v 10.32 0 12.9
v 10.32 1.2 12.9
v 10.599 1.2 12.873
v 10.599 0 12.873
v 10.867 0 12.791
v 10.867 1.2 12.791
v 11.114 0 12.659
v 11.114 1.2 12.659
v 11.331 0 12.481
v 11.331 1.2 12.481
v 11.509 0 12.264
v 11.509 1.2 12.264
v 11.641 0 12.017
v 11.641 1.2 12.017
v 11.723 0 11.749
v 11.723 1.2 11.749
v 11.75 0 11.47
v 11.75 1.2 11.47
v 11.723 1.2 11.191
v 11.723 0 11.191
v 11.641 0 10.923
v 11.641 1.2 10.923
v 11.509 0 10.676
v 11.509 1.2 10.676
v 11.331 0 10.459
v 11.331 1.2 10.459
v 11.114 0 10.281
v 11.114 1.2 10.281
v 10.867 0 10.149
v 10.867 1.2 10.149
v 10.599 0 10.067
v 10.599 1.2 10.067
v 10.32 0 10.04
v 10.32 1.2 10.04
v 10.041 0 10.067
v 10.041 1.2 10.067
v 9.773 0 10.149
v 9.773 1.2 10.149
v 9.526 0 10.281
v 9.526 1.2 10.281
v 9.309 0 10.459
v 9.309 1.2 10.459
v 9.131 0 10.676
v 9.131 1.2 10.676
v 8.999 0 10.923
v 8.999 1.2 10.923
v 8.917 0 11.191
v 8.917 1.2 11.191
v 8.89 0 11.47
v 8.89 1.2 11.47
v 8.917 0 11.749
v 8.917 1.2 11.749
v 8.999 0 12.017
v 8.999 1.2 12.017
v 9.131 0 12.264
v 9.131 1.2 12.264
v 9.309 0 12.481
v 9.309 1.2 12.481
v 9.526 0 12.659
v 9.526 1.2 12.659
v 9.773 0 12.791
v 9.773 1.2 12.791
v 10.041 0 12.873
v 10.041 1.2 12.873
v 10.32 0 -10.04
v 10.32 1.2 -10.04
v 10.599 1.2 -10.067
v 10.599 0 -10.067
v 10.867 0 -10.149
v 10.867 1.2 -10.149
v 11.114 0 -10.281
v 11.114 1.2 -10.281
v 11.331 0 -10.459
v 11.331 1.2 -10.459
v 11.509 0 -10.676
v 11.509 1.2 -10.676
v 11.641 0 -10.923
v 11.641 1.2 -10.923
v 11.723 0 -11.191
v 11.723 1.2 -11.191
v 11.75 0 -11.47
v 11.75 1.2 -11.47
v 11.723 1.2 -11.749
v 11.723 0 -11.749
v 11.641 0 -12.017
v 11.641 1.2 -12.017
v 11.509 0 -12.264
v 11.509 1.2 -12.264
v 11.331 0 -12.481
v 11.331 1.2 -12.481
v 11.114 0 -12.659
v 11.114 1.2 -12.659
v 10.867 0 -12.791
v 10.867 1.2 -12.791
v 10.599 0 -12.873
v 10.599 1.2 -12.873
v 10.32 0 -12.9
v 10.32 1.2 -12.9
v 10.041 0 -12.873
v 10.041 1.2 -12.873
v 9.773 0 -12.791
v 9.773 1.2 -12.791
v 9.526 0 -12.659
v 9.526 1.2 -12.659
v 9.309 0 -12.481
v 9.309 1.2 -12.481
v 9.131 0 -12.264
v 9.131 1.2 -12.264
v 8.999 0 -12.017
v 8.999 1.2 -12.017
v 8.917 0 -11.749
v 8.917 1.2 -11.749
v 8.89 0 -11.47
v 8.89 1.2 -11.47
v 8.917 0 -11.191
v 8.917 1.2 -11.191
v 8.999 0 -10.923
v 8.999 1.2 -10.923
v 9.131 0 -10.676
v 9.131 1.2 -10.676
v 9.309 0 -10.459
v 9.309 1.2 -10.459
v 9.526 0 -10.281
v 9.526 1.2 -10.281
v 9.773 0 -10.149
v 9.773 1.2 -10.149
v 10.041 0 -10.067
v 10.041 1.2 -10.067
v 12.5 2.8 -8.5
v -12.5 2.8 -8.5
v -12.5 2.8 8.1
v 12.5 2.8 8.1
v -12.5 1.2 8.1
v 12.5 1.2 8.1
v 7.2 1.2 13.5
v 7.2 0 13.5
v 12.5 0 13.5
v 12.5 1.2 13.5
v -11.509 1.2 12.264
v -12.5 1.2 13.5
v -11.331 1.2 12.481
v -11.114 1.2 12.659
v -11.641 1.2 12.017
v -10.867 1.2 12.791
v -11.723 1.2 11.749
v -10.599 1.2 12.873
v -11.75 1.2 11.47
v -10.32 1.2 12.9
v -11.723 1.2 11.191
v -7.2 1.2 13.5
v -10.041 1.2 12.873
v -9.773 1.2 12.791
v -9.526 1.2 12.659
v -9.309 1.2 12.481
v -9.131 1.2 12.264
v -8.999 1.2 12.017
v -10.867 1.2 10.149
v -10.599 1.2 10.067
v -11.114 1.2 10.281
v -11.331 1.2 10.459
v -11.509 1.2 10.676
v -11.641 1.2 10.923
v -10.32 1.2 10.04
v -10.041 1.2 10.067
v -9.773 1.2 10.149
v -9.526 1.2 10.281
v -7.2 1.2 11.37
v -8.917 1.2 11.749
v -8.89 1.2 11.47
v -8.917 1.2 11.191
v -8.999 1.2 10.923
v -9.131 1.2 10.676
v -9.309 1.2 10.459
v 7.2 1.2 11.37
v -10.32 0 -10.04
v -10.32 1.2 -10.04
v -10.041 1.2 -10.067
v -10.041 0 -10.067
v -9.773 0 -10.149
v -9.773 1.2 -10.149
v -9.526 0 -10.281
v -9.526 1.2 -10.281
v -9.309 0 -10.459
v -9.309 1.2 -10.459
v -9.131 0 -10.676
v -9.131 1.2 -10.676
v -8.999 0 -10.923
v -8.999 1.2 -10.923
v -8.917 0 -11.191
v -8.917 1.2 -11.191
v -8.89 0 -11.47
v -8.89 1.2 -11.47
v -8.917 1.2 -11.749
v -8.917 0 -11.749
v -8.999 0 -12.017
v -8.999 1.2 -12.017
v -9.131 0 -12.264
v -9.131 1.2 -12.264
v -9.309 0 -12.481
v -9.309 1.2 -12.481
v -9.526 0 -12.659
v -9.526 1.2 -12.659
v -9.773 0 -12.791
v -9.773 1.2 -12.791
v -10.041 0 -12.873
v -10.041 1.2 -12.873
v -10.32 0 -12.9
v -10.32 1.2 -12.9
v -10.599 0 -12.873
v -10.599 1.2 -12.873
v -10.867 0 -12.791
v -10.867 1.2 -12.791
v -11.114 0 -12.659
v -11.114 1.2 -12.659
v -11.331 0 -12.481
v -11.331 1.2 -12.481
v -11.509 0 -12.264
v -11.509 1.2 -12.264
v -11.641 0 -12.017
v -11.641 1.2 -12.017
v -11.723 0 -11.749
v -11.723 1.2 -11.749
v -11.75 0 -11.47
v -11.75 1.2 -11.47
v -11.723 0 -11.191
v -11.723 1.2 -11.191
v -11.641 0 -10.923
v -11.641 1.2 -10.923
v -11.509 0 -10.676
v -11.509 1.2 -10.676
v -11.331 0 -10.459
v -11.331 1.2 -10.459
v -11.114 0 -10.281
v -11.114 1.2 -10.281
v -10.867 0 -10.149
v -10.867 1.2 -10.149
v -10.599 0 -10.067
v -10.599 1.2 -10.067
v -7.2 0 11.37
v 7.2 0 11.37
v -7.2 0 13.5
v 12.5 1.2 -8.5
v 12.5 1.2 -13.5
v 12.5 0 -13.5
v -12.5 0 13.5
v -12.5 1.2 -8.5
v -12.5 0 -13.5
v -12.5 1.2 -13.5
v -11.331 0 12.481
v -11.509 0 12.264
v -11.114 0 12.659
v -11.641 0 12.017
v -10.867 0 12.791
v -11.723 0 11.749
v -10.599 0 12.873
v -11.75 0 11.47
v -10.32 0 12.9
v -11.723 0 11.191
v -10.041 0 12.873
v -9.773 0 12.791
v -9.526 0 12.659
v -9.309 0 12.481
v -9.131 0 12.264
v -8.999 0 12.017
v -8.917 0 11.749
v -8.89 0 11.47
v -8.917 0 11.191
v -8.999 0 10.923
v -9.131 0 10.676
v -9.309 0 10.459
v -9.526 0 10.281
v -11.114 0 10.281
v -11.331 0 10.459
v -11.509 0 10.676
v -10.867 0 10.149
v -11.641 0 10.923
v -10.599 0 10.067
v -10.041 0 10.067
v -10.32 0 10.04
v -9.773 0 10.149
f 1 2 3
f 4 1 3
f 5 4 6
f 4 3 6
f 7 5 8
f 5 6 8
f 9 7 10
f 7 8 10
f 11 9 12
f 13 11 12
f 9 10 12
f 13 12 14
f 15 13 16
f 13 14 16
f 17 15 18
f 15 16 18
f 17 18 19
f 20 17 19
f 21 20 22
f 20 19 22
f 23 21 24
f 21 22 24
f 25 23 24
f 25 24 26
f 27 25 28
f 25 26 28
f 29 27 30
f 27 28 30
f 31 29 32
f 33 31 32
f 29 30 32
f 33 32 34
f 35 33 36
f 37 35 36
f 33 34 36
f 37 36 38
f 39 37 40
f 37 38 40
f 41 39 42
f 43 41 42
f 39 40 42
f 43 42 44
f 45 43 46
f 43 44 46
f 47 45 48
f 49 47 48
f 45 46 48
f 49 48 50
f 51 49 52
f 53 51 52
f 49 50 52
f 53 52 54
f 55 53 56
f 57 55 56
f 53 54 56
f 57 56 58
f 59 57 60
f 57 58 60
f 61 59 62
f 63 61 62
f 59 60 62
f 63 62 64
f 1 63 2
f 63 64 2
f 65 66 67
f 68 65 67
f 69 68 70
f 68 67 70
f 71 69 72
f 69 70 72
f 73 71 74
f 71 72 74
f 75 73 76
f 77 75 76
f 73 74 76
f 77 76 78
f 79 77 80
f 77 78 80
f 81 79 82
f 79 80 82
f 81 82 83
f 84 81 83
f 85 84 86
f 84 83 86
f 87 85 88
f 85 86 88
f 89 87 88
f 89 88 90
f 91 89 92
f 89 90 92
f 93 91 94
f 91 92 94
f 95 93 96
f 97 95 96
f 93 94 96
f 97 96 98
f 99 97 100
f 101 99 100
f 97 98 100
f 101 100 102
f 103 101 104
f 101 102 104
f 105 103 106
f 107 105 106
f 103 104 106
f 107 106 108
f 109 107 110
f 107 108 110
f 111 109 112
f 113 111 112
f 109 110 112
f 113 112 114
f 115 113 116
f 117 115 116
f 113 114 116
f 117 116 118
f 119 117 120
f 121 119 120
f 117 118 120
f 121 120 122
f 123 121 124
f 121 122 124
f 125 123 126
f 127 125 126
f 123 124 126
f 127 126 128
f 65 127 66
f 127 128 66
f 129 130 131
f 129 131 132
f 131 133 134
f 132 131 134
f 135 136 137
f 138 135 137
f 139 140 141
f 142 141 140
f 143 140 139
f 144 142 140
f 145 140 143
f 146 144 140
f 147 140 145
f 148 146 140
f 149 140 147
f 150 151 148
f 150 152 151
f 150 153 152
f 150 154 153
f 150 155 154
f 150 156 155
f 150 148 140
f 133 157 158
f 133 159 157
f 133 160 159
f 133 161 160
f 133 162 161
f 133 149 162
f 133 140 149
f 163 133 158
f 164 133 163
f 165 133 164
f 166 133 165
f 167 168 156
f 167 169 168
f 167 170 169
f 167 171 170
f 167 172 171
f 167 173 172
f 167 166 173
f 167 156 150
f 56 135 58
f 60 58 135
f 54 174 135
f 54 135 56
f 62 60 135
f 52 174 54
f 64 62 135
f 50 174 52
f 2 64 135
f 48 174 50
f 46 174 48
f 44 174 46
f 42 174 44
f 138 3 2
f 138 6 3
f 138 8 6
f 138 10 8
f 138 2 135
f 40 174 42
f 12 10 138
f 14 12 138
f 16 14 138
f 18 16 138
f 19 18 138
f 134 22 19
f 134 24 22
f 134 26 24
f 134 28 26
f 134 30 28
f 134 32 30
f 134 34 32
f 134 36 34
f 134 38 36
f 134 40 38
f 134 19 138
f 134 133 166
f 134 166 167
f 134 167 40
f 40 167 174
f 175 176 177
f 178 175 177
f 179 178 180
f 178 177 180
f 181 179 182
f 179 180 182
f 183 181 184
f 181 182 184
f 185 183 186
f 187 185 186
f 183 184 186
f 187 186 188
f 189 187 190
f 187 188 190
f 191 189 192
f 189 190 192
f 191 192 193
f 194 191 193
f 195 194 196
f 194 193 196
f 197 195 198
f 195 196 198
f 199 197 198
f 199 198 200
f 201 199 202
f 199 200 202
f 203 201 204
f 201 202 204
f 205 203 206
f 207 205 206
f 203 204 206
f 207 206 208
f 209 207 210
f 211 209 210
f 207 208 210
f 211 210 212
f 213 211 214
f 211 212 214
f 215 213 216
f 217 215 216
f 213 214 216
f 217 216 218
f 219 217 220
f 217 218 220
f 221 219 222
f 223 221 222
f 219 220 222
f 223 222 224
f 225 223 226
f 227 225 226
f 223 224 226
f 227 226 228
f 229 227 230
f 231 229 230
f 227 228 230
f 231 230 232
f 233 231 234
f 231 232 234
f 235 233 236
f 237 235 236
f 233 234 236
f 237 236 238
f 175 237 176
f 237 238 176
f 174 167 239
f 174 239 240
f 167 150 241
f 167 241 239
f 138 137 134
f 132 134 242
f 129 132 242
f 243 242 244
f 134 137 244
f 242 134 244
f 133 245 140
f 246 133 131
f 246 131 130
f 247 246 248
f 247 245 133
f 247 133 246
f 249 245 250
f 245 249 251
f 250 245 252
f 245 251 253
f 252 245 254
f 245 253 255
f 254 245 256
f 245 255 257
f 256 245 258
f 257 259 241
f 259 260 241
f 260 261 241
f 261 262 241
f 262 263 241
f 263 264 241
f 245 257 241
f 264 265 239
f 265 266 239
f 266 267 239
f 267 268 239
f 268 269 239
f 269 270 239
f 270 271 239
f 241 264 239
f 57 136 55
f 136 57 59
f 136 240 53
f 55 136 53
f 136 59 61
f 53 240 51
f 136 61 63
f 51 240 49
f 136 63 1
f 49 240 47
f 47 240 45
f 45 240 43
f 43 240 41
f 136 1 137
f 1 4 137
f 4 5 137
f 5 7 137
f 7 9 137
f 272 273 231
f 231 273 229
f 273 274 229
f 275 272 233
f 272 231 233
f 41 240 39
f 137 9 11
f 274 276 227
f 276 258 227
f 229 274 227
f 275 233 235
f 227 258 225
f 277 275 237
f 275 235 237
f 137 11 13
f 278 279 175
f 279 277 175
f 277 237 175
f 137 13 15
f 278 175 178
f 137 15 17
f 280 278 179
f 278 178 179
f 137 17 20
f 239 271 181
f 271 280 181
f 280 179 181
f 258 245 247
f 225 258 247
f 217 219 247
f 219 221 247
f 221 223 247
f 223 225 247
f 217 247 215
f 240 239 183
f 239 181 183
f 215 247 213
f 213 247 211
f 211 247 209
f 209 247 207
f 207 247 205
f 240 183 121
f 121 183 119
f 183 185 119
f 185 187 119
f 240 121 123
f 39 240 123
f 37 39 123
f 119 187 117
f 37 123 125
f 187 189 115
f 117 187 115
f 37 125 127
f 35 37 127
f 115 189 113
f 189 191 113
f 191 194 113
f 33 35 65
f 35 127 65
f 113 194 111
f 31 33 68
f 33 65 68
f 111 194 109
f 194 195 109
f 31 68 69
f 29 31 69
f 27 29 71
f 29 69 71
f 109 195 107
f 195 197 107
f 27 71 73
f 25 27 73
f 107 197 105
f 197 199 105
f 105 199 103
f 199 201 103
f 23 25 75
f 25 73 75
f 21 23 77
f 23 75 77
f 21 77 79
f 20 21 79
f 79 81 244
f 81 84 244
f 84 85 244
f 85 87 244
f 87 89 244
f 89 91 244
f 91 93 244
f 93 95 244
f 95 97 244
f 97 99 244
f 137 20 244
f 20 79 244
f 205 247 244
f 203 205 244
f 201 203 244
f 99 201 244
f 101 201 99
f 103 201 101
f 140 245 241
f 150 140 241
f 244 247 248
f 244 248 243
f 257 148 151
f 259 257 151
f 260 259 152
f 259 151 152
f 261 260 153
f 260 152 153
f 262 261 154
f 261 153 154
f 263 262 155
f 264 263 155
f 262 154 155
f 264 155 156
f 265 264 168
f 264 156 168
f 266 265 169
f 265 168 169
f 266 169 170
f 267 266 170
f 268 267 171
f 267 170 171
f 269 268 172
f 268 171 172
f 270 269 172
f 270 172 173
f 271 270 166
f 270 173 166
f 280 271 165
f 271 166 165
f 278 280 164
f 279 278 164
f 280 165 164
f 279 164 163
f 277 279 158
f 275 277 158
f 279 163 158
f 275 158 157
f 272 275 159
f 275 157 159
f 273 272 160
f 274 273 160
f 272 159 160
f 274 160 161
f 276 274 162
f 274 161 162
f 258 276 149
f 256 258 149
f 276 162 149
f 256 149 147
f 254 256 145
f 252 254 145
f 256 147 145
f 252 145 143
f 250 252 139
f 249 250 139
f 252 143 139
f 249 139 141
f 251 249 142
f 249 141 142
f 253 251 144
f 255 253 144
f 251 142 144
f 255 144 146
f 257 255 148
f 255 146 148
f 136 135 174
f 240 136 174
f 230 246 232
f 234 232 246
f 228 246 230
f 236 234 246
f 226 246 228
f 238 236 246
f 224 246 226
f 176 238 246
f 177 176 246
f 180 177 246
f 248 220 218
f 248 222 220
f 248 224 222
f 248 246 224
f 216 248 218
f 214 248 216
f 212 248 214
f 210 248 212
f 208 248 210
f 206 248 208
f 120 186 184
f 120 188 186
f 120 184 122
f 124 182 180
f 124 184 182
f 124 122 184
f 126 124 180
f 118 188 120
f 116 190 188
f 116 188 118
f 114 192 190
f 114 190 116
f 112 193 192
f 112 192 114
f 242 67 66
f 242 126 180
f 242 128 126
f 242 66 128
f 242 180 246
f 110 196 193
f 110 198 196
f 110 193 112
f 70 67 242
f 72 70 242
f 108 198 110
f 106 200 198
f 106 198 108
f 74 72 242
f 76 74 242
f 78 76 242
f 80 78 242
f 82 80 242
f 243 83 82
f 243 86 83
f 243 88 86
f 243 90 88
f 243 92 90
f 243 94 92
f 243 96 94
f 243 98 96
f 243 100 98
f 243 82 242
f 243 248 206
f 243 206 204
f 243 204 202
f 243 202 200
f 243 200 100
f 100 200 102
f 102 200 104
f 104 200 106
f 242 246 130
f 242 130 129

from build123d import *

# Parameters (mm, degrees)
SKETCH1_W           = 25
SKETCH1_H           = 27
BOSS_EXTRUDE1_DEPTH = 1.2
SKETCH2_W           = 25
SKETCH2_H           = 16.6
BOSS_EXTRUDE2_DEPTH = 1.6
SKETCH3_R           = 1.43
SKETCH3_W           = 14.4
SKETCH3_H           = 2.13
CUT_EXTRUDE1_DEPTH  = 1.2


with BuildPart() as part:
    # Sketch1 → Boss-Extrude1 (new body)
    with BuildSketch(Plane(origin=(0, 0, 0), x_dir=(1, 0, 0), z_dir=(0, 1, 0))):
        Rectangle(SKETCH1_W, SKETCH1_H)
    extrude(amount=BOSS_EXTRUDE1_DEPTH)

    # Sketch2 → Boss-Extrude2 (add)
    with BuildSketch(Plane(origin=(0, 1.2, 0), x_dir=(1, 0, 0), z_dir=(0, 1, 0))):
        with Locations((0, 0.2)):
            Rectangle(SKETCH2_W, SKETCH2_H)
    extrude(amount=BOSS_EXTRUDE2_DEPTH)

    # Sketch3 → Cut-Extrude1 (cut)
    with BuildSketch(Plane(origin=(0, 1.2, 0), x_dir=(1, 0, 0), z_dir=(0, 1, 0))):
        with Locations(Location((10.32, 11.47, 0), (0, 0, 270))):
            Circle(SKETCH3_R)
        with Locations(Location((-10.32, 11.47, 0), (0, 0, 270))):
            Circle(SKETCH3_R)
        with Locations(Location((-10.32, -11.47, 0), (0, 0, 270))):
            Circle(SKETCH3_R)
        with Locations(Location((10.32, -11.47, 0), (0, 0, 270))):
            Circle(SKETCH3_R)
        with Locations((0, -12.435)):
            Rectangle(SKETCH3_W, SKETCH3_H)
    extrude(amount=-CUT_EXTRUDE1_DEPTH, mode=Mode.SUBTRACT)


solid = part.part
